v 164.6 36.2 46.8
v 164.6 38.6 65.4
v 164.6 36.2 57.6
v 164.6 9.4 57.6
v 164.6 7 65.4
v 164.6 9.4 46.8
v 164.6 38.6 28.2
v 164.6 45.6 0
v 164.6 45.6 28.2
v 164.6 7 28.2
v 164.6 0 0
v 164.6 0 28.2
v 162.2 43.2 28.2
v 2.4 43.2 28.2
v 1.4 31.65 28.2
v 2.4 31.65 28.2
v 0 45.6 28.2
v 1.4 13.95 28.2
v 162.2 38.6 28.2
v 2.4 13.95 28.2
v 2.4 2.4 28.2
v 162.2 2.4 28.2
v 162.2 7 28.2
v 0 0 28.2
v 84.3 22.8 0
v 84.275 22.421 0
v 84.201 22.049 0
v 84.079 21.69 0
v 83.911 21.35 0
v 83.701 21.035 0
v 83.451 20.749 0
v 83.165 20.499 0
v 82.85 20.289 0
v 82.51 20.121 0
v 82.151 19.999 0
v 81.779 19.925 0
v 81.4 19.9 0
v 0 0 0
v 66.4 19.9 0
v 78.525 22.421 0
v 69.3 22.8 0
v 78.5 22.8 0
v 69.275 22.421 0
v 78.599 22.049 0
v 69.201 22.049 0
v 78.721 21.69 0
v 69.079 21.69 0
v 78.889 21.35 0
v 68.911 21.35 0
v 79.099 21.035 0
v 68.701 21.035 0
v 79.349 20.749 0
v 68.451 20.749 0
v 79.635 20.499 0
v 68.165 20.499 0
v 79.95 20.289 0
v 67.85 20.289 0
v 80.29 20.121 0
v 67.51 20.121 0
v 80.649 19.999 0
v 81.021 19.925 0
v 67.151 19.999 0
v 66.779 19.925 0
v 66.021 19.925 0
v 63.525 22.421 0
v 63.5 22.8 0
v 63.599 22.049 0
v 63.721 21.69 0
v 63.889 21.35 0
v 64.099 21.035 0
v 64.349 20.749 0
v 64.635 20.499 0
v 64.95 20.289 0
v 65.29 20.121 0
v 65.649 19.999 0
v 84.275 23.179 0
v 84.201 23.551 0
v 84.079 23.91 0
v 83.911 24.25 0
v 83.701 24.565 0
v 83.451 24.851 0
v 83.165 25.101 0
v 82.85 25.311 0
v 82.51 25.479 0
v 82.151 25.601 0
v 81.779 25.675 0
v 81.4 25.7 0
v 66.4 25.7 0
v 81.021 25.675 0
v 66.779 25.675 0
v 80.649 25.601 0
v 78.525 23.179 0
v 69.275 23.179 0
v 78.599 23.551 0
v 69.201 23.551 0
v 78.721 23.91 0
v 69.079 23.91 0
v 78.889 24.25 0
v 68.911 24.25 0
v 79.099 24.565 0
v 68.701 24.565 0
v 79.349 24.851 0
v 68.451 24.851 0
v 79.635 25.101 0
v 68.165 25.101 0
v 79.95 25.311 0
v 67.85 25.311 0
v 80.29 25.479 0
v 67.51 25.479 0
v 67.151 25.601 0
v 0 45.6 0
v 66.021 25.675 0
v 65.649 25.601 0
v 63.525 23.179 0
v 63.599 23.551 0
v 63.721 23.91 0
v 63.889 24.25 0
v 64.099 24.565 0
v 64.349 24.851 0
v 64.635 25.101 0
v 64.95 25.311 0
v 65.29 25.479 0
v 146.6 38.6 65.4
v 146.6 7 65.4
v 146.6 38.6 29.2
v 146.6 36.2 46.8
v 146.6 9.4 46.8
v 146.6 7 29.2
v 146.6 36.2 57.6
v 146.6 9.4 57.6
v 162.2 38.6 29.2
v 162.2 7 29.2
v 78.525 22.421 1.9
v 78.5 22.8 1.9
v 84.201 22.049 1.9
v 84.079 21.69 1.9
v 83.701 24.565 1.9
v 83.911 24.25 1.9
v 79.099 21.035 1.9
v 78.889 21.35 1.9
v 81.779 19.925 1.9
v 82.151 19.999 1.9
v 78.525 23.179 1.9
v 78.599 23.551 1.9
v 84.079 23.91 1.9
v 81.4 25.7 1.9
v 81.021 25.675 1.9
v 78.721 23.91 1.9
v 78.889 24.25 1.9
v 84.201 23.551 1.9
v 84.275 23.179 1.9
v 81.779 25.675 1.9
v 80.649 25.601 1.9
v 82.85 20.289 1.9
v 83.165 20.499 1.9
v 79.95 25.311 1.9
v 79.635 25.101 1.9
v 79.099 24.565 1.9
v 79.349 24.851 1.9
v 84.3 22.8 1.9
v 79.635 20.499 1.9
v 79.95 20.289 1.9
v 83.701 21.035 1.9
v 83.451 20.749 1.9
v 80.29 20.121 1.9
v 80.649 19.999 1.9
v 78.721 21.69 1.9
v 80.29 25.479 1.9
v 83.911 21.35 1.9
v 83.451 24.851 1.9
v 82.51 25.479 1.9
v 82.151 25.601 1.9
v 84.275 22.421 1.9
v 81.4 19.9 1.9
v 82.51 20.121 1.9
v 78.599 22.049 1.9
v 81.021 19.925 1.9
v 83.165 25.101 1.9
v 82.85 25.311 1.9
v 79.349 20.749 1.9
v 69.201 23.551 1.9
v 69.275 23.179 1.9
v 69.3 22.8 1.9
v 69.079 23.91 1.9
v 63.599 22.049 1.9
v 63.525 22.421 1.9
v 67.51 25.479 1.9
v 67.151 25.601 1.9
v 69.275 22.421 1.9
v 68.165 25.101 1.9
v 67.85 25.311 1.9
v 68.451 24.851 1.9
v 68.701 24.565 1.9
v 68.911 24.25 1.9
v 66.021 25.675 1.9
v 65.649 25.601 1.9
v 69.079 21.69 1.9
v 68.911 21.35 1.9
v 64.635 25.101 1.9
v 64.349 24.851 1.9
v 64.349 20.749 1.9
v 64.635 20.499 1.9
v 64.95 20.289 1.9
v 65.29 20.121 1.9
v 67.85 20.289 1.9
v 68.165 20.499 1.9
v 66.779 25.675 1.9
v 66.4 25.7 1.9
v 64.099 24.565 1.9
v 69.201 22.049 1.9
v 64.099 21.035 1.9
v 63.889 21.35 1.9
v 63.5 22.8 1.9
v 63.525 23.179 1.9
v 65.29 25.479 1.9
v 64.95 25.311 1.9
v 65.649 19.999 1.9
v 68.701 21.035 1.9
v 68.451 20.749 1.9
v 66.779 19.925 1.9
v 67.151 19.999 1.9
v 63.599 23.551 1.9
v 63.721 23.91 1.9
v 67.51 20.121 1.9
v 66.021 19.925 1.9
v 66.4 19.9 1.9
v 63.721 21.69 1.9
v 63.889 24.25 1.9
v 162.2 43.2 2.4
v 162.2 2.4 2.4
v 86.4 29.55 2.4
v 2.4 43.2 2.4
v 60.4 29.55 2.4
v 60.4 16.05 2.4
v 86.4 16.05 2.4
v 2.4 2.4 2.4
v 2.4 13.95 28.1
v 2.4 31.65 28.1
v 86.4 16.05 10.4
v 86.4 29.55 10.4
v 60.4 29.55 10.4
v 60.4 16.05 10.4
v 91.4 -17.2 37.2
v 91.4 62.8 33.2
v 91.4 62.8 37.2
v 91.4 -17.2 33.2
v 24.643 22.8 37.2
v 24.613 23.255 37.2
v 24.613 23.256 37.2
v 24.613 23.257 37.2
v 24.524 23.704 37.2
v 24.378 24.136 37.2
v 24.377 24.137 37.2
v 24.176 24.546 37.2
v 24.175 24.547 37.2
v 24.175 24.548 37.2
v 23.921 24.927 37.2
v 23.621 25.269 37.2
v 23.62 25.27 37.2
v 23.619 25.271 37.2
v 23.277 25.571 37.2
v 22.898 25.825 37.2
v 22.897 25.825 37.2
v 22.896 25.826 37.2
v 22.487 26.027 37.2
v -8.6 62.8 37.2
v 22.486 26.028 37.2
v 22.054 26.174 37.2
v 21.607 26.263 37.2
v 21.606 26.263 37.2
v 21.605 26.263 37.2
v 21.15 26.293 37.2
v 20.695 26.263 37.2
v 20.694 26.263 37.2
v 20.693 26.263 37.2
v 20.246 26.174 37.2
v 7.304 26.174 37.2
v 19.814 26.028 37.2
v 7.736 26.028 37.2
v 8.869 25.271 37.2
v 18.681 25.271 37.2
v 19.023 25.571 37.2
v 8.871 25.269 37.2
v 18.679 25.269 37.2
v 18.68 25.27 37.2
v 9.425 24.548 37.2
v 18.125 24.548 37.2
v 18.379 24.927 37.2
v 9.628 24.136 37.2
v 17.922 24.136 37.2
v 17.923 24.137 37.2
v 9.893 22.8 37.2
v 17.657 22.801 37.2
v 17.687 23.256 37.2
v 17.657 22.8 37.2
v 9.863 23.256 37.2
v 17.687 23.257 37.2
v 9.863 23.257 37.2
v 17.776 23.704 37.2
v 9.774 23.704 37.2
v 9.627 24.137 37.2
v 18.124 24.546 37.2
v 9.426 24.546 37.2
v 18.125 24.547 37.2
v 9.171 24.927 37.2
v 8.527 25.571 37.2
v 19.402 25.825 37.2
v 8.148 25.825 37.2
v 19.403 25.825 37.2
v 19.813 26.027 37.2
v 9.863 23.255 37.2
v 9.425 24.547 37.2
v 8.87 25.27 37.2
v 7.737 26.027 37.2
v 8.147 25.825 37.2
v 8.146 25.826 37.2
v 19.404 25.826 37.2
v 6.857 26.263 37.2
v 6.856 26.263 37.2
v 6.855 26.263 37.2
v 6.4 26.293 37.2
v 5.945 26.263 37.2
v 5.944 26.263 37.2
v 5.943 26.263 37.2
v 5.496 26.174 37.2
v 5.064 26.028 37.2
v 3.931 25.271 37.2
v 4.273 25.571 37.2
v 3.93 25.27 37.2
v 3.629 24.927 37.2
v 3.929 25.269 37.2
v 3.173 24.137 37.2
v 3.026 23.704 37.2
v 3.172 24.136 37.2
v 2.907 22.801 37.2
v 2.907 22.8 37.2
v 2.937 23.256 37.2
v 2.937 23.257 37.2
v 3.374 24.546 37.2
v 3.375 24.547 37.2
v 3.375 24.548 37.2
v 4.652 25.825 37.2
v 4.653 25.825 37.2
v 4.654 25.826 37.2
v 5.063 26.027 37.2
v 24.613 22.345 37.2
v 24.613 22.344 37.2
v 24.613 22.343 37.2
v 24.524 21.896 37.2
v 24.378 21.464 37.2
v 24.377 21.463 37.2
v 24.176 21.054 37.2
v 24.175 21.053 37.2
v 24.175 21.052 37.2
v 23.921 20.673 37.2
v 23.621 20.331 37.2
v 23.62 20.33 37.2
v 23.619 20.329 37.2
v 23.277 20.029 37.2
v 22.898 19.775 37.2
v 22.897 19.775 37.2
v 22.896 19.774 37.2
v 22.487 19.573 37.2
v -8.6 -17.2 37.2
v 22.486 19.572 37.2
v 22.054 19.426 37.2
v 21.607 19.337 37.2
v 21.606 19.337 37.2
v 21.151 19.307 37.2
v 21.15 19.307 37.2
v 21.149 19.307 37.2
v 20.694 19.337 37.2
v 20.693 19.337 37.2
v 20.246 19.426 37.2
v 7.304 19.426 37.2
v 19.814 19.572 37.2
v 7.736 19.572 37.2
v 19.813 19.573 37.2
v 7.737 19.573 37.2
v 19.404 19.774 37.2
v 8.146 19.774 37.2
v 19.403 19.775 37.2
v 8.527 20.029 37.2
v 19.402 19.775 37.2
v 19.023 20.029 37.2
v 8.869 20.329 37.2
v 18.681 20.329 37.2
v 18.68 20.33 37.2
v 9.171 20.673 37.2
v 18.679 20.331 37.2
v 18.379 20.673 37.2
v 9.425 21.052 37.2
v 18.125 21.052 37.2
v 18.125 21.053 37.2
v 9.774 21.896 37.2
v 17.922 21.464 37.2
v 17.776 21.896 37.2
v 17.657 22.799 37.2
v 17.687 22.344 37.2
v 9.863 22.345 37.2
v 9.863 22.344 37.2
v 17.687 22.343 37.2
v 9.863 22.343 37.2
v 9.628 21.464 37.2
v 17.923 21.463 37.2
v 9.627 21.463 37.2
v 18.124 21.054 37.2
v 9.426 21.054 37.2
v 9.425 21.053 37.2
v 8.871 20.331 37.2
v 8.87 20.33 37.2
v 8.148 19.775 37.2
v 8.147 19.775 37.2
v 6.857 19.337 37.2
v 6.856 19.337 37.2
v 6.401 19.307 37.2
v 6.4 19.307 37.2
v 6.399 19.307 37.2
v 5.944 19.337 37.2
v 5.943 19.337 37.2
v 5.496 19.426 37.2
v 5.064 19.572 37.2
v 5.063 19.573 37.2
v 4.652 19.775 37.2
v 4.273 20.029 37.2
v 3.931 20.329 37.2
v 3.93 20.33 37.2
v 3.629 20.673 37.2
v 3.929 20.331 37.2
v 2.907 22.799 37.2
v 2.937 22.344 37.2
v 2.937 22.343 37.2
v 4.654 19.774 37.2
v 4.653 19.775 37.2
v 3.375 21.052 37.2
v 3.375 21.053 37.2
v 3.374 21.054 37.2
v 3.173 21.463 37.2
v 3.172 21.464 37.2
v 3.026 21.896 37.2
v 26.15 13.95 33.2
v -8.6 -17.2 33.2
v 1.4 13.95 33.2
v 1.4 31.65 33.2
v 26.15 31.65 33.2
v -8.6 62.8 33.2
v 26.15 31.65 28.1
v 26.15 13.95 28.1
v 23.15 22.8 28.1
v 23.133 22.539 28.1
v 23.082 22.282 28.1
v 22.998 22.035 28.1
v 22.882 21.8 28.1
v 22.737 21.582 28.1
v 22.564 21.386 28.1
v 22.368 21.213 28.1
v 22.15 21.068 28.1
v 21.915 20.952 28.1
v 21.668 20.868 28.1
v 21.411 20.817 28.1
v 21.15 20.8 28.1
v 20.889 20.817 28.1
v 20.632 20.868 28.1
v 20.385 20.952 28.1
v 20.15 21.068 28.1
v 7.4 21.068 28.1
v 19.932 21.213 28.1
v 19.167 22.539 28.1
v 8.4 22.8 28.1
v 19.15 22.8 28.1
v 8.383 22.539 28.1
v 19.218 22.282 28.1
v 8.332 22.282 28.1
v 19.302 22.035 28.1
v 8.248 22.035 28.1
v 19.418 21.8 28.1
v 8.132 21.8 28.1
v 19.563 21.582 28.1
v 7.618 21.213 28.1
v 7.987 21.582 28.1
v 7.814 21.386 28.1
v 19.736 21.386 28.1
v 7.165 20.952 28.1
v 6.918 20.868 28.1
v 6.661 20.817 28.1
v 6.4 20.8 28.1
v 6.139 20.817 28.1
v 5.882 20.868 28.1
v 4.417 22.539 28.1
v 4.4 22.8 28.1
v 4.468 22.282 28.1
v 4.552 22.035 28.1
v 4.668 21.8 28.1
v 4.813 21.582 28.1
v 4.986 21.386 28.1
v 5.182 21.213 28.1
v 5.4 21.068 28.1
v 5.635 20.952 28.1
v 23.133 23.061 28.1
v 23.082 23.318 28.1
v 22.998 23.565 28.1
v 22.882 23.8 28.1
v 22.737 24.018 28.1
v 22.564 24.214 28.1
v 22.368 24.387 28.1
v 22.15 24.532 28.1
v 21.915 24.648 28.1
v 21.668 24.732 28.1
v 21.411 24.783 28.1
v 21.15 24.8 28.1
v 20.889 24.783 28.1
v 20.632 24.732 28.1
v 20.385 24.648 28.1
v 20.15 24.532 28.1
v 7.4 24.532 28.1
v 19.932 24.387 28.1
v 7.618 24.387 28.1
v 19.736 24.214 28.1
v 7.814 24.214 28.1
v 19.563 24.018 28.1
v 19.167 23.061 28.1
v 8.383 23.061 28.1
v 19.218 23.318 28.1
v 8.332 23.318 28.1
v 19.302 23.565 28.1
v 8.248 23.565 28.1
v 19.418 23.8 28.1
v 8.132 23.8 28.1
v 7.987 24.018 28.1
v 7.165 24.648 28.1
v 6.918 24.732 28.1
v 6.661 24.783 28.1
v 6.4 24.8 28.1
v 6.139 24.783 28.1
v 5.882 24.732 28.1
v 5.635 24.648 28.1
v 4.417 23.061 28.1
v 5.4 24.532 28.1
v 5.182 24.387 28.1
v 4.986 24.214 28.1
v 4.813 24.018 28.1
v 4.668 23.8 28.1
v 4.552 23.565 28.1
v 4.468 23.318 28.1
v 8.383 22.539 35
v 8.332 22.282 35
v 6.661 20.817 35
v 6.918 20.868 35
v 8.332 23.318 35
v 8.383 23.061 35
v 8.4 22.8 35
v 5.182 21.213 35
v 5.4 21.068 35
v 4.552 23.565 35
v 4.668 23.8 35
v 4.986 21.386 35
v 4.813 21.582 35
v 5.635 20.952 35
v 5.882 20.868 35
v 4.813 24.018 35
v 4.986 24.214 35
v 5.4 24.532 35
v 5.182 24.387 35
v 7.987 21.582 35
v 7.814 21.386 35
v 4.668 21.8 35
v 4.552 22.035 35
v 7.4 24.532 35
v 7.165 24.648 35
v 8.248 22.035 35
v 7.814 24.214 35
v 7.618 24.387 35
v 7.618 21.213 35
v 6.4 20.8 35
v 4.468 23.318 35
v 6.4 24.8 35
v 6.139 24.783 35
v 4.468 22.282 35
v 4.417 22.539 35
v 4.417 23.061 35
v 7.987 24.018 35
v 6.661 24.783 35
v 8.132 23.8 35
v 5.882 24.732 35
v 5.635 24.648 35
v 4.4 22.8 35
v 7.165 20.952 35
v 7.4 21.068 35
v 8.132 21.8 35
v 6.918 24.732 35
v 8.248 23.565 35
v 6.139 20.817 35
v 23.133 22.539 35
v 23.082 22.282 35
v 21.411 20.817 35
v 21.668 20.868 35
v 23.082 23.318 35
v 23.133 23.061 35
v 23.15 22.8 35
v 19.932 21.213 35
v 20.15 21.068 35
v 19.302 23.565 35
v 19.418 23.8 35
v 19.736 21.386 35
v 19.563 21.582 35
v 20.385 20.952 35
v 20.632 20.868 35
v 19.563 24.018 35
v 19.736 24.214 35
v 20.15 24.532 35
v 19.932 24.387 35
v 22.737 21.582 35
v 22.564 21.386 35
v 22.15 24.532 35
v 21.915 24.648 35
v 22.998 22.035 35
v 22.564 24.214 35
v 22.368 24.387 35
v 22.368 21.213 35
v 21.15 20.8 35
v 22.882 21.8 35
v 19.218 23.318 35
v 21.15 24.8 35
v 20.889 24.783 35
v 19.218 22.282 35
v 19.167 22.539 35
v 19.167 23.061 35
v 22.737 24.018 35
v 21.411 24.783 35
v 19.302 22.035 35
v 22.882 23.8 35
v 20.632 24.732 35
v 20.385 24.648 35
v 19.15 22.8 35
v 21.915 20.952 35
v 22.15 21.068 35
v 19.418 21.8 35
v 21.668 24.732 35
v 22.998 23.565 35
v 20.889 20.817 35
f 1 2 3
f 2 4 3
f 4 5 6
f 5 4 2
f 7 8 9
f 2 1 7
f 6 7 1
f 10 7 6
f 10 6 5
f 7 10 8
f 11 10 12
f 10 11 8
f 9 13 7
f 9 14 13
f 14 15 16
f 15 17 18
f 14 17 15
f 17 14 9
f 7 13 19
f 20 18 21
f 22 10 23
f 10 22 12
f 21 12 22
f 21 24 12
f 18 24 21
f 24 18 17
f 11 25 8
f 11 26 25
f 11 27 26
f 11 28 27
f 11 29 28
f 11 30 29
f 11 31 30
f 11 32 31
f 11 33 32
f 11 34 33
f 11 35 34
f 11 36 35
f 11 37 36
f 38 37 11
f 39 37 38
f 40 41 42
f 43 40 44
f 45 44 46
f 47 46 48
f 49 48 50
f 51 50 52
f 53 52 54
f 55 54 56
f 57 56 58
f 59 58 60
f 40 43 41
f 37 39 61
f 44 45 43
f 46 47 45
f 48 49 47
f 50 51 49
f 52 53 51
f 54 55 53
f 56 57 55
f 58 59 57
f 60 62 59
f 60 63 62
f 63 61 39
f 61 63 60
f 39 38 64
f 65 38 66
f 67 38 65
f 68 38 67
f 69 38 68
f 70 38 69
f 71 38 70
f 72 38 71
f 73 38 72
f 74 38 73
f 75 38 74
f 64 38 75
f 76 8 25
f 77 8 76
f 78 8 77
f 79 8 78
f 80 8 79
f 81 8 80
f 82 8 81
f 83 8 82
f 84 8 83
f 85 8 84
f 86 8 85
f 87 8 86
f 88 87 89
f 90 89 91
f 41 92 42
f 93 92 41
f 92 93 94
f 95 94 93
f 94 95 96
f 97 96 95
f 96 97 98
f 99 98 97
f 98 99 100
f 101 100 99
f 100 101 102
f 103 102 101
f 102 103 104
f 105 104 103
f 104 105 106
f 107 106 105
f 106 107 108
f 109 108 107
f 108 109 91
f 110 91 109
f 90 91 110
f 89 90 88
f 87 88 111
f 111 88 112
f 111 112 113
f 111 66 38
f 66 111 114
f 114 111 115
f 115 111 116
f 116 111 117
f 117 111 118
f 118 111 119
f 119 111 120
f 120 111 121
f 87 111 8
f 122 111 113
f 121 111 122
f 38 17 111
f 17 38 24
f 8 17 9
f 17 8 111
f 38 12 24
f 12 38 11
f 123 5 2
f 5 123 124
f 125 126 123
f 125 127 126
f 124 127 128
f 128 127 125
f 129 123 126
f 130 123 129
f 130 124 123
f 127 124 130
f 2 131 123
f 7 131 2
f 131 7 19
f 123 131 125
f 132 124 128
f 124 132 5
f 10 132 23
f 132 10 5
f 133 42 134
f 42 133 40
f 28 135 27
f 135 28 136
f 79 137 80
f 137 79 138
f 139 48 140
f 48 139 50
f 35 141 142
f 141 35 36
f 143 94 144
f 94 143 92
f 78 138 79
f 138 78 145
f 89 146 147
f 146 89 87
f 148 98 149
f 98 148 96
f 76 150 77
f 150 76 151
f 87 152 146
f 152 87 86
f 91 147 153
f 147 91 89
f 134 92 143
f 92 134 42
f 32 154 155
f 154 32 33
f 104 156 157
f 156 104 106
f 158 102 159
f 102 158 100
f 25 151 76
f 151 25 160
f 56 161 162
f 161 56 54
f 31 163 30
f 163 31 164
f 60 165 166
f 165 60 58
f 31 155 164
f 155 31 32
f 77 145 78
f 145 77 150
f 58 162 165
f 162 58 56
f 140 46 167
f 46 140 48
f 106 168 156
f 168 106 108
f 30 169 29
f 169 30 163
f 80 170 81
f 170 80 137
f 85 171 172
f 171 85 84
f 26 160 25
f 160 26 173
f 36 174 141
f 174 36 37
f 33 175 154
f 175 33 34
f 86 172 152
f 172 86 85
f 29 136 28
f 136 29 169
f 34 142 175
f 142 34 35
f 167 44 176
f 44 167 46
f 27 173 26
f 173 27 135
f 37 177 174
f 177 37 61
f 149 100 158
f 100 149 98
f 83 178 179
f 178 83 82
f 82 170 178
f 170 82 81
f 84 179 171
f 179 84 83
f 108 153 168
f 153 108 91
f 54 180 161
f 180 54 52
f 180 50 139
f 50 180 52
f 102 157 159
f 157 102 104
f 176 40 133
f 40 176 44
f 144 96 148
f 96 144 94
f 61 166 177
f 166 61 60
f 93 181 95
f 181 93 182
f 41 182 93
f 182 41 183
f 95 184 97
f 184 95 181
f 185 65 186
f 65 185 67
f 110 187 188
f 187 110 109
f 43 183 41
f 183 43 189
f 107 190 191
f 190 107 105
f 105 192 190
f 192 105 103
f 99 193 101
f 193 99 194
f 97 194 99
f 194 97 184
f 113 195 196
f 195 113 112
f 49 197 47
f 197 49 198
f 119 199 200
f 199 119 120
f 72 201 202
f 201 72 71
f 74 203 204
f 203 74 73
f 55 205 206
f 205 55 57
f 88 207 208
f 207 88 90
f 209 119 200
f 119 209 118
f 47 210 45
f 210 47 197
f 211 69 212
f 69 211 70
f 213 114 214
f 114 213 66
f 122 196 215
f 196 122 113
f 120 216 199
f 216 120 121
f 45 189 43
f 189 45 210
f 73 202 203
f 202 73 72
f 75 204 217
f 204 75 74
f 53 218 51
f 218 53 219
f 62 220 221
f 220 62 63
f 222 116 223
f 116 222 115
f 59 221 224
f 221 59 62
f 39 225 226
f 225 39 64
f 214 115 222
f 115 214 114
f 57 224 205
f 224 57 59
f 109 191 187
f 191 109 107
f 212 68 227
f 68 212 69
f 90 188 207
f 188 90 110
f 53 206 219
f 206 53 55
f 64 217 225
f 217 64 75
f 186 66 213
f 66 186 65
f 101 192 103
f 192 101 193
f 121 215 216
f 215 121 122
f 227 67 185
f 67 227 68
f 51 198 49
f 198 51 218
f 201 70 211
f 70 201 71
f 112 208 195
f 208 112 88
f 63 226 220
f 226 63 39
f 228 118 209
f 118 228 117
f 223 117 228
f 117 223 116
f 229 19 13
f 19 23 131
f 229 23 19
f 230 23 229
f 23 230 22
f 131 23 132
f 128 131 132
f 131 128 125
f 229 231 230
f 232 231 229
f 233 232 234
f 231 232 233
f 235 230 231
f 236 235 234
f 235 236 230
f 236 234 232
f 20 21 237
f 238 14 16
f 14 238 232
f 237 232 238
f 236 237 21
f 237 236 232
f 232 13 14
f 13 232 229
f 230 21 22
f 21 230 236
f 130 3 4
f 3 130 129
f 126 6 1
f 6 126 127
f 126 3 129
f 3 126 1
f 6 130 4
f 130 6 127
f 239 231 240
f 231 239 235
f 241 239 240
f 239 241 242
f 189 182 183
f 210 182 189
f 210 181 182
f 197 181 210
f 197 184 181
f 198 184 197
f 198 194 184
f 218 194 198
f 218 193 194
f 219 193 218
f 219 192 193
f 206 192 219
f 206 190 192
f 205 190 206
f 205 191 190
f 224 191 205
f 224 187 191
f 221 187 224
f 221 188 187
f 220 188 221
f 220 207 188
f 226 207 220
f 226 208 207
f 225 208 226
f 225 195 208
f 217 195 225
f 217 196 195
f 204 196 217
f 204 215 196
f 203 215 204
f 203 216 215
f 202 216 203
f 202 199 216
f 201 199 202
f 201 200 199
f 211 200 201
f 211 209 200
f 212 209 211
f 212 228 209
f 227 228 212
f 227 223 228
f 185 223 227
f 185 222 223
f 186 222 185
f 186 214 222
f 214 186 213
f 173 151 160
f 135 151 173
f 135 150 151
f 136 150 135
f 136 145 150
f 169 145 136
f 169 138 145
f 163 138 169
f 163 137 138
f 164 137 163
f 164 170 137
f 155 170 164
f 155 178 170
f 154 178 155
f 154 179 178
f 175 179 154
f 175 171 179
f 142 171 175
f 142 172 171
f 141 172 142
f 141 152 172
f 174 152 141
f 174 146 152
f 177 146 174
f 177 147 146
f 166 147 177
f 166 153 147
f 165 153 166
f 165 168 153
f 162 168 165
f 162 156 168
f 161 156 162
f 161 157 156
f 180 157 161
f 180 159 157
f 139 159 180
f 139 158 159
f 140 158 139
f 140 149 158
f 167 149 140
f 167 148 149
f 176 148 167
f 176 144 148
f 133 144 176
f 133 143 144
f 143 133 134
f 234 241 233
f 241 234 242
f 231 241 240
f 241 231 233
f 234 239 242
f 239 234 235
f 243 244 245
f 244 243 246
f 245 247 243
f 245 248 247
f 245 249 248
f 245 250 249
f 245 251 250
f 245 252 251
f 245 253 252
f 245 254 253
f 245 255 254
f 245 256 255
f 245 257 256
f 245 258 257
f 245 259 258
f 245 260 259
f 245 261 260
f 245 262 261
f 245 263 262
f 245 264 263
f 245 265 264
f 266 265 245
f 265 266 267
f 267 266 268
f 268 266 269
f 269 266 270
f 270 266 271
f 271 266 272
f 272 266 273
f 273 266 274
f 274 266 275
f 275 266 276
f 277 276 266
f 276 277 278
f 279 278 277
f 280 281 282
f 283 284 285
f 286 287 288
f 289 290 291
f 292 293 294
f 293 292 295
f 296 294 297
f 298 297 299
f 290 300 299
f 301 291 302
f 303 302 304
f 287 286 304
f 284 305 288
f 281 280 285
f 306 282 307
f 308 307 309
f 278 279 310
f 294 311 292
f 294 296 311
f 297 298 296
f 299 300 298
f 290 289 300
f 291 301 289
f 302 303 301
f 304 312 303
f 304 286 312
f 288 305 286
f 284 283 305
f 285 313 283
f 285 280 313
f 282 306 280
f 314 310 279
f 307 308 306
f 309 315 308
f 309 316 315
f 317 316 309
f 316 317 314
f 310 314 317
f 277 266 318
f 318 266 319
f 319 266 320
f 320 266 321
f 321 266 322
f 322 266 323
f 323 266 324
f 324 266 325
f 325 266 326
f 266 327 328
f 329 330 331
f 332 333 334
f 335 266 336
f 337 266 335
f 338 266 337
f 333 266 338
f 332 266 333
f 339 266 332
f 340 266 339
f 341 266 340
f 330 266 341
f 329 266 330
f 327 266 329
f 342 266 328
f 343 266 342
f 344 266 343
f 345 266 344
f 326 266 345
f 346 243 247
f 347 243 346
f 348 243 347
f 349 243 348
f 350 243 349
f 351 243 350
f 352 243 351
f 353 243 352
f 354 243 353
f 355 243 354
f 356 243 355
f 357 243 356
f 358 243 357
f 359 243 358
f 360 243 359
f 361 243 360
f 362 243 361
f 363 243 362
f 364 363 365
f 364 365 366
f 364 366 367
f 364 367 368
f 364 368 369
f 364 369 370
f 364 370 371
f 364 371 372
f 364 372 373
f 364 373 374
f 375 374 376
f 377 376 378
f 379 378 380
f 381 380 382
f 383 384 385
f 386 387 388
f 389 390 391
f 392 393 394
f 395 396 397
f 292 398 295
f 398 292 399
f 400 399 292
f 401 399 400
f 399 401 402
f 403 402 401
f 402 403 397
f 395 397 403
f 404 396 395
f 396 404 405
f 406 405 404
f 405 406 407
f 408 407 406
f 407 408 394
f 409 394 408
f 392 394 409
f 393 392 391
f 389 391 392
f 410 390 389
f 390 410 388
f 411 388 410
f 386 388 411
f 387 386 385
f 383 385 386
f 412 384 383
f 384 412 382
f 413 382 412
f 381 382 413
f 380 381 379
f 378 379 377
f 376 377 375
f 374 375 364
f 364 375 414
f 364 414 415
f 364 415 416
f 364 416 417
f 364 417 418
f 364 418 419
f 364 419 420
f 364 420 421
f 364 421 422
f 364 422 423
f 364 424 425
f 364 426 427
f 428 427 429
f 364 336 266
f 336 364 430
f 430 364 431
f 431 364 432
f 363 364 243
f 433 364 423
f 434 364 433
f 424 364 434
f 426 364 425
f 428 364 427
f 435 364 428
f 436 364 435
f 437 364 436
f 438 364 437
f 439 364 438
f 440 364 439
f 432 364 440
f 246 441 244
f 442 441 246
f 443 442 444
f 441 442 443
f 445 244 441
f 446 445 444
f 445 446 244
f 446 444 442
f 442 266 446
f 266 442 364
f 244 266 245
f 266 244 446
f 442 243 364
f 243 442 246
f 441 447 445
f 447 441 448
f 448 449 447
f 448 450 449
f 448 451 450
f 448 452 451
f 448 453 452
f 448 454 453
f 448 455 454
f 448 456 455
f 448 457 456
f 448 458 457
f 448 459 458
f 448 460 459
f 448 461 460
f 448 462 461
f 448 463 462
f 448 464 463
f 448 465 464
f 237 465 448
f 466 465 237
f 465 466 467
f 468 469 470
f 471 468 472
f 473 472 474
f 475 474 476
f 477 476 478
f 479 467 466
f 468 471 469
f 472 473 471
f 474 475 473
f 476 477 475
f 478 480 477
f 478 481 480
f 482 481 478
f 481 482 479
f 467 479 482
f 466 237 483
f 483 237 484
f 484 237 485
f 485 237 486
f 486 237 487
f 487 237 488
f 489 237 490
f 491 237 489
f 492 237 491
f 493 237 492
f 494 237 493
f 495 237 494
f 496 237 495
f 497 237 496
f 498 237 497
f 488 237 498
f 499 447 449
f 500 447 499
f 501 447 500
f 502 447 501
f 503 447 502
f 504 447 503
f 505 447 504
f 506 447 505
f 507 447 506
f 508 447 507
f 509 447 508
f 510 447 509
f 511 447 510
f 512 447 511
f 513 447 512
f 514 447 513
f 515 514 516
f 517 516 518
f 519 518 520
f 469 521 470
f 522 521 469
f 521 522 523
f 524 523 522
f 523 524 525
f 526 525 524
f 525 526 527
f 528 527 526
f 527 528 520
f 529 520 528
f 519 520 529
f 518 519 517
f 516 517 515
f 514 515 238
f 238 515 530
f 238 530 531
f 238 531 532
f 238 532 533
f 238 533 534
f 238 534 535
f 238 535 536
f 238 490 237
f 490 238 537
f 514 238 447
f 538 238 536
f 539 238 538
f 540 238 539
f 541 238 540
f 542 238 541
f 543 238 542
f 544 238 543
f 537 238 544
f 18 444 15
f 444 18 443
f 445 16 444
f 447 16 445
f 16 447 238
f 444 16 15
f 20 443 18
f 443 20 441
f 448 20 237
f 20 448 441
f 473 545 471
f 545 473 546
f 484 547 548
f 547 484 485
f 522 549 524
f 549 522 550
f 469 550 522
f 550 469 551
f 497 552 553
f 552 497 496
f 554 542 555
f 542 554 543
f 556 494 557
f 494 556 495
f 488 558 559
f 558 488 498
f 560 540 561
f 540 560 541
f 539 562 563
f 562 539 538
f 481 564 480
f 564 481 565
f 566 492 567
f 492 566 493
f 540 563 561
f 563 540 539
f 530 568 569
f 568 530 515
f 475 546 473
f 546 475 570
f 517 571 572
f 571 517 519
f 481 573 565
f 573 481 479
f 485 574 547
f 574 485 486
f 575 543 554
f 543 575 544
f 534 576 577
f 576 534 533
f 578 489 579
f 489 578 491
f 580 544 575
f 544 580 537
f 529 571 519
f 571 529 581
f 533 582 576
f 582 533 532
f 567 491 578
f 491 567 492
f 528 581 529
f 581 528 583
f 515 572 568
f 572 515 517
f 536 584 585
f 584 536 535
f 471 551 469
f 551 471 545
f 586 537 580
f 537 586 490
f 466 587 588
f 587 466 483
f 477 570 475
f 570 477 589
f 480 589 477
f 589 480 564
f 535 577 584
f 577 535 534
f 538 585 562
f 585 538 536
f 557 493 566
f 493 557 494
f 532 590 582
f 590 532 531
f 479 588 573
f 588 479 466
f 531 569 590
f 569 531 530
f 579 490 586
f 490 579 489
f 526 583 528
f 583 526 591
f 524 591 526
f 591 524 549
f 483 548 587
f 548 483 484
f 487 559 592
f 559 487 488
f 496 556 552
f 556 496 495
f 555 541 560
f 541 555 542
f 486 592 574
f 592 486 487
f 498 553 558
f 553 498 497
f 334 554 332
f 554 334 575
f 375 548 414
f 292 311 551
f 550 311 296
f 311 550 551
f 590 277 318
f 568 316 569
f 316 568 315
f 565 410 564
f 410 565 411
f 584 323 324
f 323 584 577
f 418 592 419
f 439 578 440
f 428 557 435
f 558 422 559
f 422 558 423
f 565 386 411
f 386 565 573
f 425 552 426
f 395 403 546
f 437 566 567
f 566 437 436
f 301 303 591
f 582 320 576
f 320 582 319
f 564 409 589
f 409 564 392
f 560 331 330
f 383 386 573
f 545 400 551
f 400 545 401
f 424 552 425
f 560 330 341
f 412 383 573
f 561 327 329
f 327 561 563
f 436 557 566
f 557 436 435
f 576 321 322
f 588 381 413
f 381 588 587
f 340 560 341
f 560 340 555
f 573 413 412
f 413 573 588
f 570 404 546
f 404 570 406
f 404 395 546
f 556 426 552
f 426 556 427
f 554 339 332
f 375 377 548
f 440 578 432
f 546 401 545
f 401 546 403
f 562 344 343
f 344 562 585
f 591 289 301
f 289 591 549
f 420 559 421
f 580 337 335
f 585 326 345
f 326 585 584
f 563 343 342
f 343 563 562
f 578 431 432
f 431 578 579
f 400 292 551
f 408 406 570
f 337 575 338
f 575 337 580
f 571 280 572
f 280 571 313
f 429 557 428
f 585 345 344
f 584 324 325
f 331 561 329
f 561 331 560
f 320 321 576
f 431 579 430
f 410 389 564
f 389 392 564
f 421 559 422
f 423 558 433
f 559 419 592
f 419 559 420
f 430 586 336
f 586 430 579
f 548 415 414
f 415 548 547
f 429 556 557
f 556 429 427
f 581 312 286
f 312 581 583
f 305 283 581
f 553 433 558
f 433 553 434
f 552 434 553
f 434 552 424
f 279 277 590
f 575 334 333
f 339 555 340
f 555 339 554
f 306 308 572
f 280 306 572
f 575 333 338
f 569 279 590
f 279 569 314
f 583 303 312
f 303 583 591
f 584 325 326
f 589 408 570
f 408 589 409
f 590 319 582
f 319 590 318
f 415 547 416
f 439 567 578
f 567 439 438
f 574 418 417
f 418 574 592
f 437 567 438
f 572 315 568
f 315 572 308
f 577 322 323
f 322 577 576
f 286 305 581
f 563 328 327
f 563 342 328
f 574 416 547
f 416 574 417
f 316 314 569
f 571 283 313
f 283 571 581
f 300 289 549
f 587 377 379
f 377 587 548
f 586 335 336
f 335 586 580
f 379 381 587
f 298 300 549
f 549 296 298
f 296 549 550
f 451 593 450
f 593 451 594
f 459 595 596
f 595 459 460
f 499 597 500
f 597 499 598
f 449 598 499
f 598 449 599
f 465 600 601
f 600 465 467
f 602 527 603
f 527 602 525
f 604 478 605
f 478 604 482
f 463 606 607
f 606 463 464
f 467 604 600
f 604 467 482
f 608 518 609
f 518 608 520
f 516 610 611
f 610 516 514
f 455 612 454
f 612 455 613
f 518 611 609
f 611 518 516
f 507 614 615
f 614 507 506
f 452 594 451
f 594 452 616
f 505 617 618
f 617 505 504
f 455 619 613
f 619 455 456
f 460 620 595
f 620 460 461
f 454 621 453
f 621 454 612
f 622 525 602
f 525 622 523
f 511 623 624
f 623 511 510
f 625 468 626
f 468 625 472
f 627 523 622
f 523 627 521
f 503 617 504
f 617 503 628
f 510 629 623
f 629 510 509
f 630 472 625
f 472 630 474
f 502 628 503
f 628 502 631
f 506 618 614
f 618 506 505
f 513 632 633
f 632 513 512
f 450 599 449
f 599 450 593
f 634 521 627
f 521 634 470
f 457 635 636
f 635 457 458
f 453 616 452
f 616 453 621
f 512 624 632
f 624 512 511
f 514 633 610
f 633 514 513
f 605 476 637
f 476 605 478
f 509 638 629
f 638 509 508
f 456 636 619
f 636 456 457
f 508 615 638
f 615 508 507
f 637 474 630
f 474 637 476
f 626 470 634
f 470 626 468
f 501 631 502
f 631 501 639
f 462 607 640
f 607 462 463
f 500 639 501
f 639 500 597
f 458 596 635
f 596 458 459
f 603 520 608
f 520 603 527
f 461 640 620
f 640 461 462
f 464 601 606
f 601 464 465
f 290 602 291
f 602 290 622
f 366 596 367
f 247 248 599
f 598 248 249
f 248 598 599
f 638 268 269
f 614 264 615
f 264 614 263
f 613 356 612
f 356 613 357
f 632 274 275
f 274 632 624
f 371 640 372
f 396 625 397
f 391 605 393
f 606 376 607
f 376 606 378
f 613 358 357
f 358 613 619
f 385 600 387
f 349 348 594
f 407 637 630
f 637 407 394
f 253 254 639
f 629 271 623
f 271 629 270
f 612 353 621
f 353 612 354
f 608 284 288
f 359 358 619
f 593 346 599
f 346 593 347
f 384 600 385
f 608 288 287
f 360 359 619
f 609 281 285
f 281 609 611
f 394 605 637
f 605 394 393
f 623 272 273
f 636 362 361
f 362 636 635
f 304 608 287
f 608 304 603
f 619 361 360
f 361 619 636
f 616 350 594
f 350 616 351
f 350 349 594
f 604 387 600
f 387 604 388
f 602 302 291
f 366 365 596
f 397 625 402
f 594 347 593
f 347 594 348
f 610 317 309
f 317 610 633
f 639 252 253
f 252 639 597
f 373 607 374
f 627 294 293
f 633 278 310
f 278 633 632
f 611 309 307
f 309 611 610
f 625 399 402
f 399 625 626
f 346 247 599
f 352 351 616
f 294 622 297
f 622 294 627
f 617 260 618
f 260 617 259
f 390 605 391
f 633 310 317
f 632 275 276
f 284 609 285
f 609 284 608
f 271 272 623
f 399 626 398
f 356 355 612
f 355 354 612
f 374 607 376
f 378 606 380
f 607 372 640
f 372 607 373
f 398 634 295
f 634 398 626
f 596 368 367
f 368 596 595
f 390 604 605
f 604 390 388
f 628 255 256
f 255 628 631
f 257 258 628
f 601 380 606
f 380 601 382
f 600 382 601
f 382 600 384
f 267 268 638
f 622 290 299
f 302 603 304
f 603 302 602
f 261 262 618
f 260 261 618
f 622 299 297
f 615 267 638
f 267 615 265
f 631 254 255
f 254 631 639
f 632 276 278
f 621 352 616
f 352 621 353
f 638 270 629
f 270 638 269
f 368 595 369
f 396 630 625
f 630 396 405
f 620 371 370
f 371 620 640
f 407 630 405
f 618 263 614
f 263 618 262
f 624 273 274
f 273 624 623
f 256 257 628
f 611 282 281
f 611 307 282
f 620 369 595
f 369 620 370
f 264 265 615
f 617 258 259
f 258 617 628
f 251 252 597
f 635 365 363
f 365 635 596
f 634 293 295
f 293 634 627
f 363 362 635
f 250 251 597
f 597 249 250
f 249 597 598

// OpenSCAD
// Maßarbeit Waage - Gehäuse (v1, zum Testdrucken)
//
// Eigenes, parametrisches Design - NICHT von WeighMyBru2s Original-CAD
// (cad/step im weighmybru2-Repo) abgeleitet. Das war dort auf komplett
// andere Hardware zugeschnitten (separates ESP32-Board + separates Display
// + kapazitive Touch-Pads, je eigener "Clamp"), passt geometrisch nicht zu
// unserer Hardware (LilyGO T-Display S3 in einem Stück, physische Taster,
// groessere 3kg-Waegezelle). Uebernommen wurde nur das Grundkonzept
// (Bottom/Top-Split, Waegezelle einseitig fest verschraubt, freies Ende
// traegt die Plattform).
//
// Alle Bauteil-Masse stammen aus echten Messungen (siehe Chat-Verlauf),
// nicht aus Datenblaettern - fuer ein eng anliegendes 3D-Druck-Gehaeuse
// zuverlaessiger als Referenzwerte, die je nach Fertigungscharge abweichen
// koennen.
//
// Mechanik: Standard-Single-Point-Aufbau, jedes Ende hat ZWEI Loecher
// (verhindert Verdrehen/Kippeln):
//   - Festes Ende (2x M4, Kabelaustritt): liegt auf einem Sockel in der
//     Bodenschale, Schrauben kommen von unten durch den Sockel in die Zelle.
//   - Freies Ende (2x M3): traegt die separate Plattform. Die Plattform hat
//     KEINEN Kontakt zur Bodenschale - nur zur Waegezelle - sonst verfaelscht
//     das die Messung. Schrauben kommen von oben durch die Plattform in die
//     Zelle (siehe platform()-Modul).
//
// Rendern (Kommandozeile):
//   openscad -o base.stl     -D part=\"base\"     massarbeit_waage_case.scad
//   openscad -o platform.stl -D part=\"platform\" massarbeit_waage_case.scad
//   openscad -o preview.png  -D part=\"preview\"  --imgsize=1400,1000 --autocenter --viewall massarbeit_waage_case.scad

part = "preview"; // "base" | "platform" | "preview" (beide zusammen, Sichtkontrolle)

$fn = 48;

// ---------------------------------------------------------------------
// Gemessene Bauteil-Masse
// ---------------------------------------------------------------------
wall = 2.4;  // Wandstaerke
clr  = 0.4;  // allgemeines Spiel pro Seite (Steckpassung)

// LilyGO T-Display S3 (L x B x H, H = hoechster Punkt: USB-C-Buchse)
board_l = 62;
board_w = 26;
board_h = 10;

// HX711-Modul
hx_l = 35;
hx_w = 20;
hx_h = 10; // Annahme (Pinleisten/Bauteile) - bei Bedarf anpassen

// Waegezelle YZC-133 (12.7 x 12.7 x 80mm Alu-Balken)
lc_l = 80;
lc_w = 12.7;
lc_h = 12.7;
// Jedes Ende hat ZWEI Loecher (verhindert Verdrehen): eines nahe der Kante,
// eines bei 20mm - auf beiden Enden identisch beabstandet.
lc_fixed_hole_d       = 4.3;  // M4-Durchgangsloch fuer die Schraube
lc_fixed_hole_offset1 = 5.0;  // Kabelaustritts-Ende -> Lochmitte, Loch 1
lc_fixed_hole_offset2 = 20.0; // Kabelaustritts-Ende -> Lochmitte, Loch 2
lc_load_hole_d        = 3.4;  // M3-Durchgangsloch
lc_load_hole_offset1  = 5.25; // freies Ende -> Lochmitte, Loch 1
lc_load_hole_offset2  = 20.0; // freies Ende -> Lochmitte, Loch 2

// Akku 3000mAh LiPo (Zellcode 103665 = 10 x 36 x 65mm, T x B x L)
bat_l = 65;
bat_w = 36;
bat_h = 10;

// ---------------------------------------------------------------------
// Abgeleitetes Layout
// ---------------------------------------------------------------------
lc_boss_h      = 8; // Sockelhoehe am festen Ende - Zelle liegt OBEN drauf
lc_clear_under = 5; // Luftspalt unter der freien Balkenlaenge (Durchbiegung
                     // unter 3kg ist Bruchteile eines mm - 5mm ist
                     // grosszuegig, laesst noch Platz fuer Kabel)
lc_boss_len    = lc_fixed_hole_offset2 + 6; // deckt beide Loecher + Rand ab
margin         = 4; // Luft zwischen Zellenenden und Buchtwaenden

sensor_bay_w = max(lc_w + 16, board_w + 6);
sensor_bay_l = lc_l + 2*margin;

elec_bay_w    = bat_w + 2*clr + 4;
elec_bay_l    = max(bat_l, hx_l) + 2*clr + 6;
hx_standoff_h = 3; // Stand zwischen Akku-Oberseite und HX711
elec_bay_h    = bat_h + hx_standoff_h + hx_h + clr;

// Anzeige-Turm hinten: Board steht senkrecht, Bildschirm zeigt nach oben/vorn
// - USB-C+Taster-Kante zeigt nach hinten aus dem Gehaeuse. (Schraege Neigung
// ist fuer v2 vorgesehen, fuer den Testdruck erstmal gerade - einfacher zu
// pruefen, ob Mechanik/Masse passen.)
tower_w     = board_w + 2*wall + 2*clr;
tower_depth = 18;

base_int_w = max(sensor_bay_w, elec_bay_w, tower_w);
base_int_l = sensor_bay_l + elec_bay_l;
base_int_h = max(lc_boss_h + lc_h + 3, elec_bay_h + wall);

base_ext_w = base_int_w + 2*wall;
base_ext_l = base_int_l + 2*wall;
base_ext_h = base_int_h + wall;

// X-Koordinaten der Waegezelle innerhalb der Bodenschale: freies Ende zeigt
// nach vorn (kleines X), festes Ende (Kabelaustritt) nach hinten zur
// Elektronik-Bucht (grosses X).
lc_x_free_edge  = wall + margin;
lc_x_fixed_edge = lc_x_free_edge + lc_l;
lc_y_center     = base_ext_w / 2;

hole_fixed1_x = lc_x_fixed_edge - lc_fixed_hole_offset1;
hole_fixed2_x = lc_x_fixed_edge - lc_fixed_hole_offset2;
hole_load1_x  = lc_x_free_edge + lc_load_hole_offset1;
hole_load2_x  = lc_x_free_edge + lc_load_hole_offset2;

// Plattform (lose Deckplatte, traegt Glas/Becher)
platform_l   = 100;
platform_w   = 80;
platform_t   = 4;
platform_boss_w = lc_w + 5;
platform_boss_len = lc_load_hole_offset2 - lc_load_hole_offset1 + 10; // deckt beide Loecher ab
platform_boss_h = base_ext_h - (wall + lc_boss_h + lc_h); // bis exakt auf Zellen-Oberkante
platform_hole1_x = 15;                              // lokale Plattform-Koordinate
platform_hole2_x = platform_hole1_x + (lc_load_hole_offset2 - lc_load_hole_offset1);

// ---------------------------------------------------------------------
// Bodenschale
// ---------------------------------------------------------------------
module base_shell() {
    difference() {
        union() {
            // Hauptkorpus
            cube([base_ext_l, base_ext_w, base_ext_h]);

            // Anzeige-Turm hinten, senkrecht (v1 - Neigung folgt in v2).
            // 0.5mm Ueberlappung nach unten - gleicher Grund wie bei den
            // Sockeln (siehe Kommentare weiter unten).
            translate([base_ext_l - tower_depth, (base_ext_w - tower_w) / 2, base_ext_h - 0.5])
                cube([tower_depth, tower_w, board_l * 0.6 + 0.5]);
        }

        // Innenraum aushoehlen (offen nach oben)
        translate([wall, wall, wall])
            cube([base_int_l, base_int_w, base_int_h + 1]);

        // Waegezellen-Fach unter Balkenhoehe absenken (ausser dort, wo der
        // Sockel fuer das feste Ende steht - der wird danach wieder
        // aufgesetzt, siehe union() unten).
        translate([wall, lc_y_center - lc_w/2 - clr - 1, wall + lc_boss_h - lc_clear_under])
            cube([sensor_bay_l, lc_w + 2*clr + 2, lc_clear_under + 1]);

        // Kabeldurchfuehrung vom Waegezellen-Fach in die Elektronik-Bucht
        translate([lc_x_fixed_edge - 3, lc_y_center - 4, wall])
            cube([12, 8, lc_boss_h + 4]);

        // Zugriffsloecher von unten fuers Verschrauben am festen Ende (2x)
        for (hx = [hole_fixed1_x, hole_fixed2_x]) {
            translate([hx, lc_y_center, -1])
                cylinder(d = lc_fixed_hole_d + 1.5, h = wall + lc_boss_h + 2);
        }

        // USB-C + Taster-Ausschnitt am Turm (kurze Kante der Platine zeigt
        // nach hinten raus)
        translate([base_ext_l - tower_depth - 1, (base_ext_w - (board_w + 2*clr)) / 2, base_ext_h + board_l * 0.3])
            cube([tower_depth + 2, board_w + 2*clr, board_h + 2*clr]);
    }

    // Sockel fuer das feste Waegezellen-Ende (Zelle liegt oben drauf).
    // Ueberlappt 0.5mm in den Boden hinein, sonst verschmilzt CGAL die
    // beiden Koerper nicht zu einem einzigen druckbaren Volumen (Boolean
    // Union auf exakt deckungsgleichen Flaechen ist nicht zuverlaessig).
    translate([lc_x_fixed_edge - lc_boss_len, lc_y_center - lc_w/2 - clr, wall - 0.5])
        cube([lc_boss_len, lc_w + 2*clr, lc_boss_h + 0.5]);
}

// ---------------------------------------------------------------------
// Lose Deckplatte / Plattform
// ---------------------------------------------------------------------
module platform() {
    difference() {
        union() {
            cube([platform_l, platform_w, platform_t]);
            // Auflage-/Schraubdom, trifft exakt auf die Zellen-Oberkante,
            // deckt beide Loecher des freien Endes ab. 0.5mm Ueberlappung
            // in die Platte hinein - gleicher Grund wie beim Sockel oben.
            translate([platform_hole1_x - 5, platform_w/2 - platform_boss_w/2, -platform_boss_h])
                cube([platform_boss_len, platform_boss_w, platform_boss_h + 0.5]);
        }
        // Schraubenloecher von oben durch Platte + Dom in die Zelle (2x M3)
        for (hx = [platform_hole1_x, platform_hole2_x]) {
            translate([hx, platform_w/2, -platform_boss_h - 1])
                cylinder(d = lc_load_hole_d + 0.6, h = platform_t + platform_boss_h + 2);
            // Senkung fuer den Schraubenkopf
            translate([hx, platform_w/2, platform_t - 2.2])
                cylinder(d1 = lc_load_hole_d + 0.6, d2 = 7, h = 2.21);
        }
    }
}

// ---------------------------------------------------------------------
// Ausgabe
// ---------------------------------------------------------------------
if (part == "base") {
    base_shell();
} else if (part == "platform") {
    platform();
} else {
    // Sichtkontrolle: beide Teile ungefaehr in eingebauter Position
    // (Feinausrichtung ist fuers Rendern irrelevant - beide Teile werden
    // separat gedruckt).
    color("SteelBlue") base_shell();
    color("Goldenrod", 0.85)
        translate([lc_x_free_edge - platform_hole1_x, (base_ext_w - platform_w) / 2, base_ext_h + lc_clear_under])
            platform();
}
